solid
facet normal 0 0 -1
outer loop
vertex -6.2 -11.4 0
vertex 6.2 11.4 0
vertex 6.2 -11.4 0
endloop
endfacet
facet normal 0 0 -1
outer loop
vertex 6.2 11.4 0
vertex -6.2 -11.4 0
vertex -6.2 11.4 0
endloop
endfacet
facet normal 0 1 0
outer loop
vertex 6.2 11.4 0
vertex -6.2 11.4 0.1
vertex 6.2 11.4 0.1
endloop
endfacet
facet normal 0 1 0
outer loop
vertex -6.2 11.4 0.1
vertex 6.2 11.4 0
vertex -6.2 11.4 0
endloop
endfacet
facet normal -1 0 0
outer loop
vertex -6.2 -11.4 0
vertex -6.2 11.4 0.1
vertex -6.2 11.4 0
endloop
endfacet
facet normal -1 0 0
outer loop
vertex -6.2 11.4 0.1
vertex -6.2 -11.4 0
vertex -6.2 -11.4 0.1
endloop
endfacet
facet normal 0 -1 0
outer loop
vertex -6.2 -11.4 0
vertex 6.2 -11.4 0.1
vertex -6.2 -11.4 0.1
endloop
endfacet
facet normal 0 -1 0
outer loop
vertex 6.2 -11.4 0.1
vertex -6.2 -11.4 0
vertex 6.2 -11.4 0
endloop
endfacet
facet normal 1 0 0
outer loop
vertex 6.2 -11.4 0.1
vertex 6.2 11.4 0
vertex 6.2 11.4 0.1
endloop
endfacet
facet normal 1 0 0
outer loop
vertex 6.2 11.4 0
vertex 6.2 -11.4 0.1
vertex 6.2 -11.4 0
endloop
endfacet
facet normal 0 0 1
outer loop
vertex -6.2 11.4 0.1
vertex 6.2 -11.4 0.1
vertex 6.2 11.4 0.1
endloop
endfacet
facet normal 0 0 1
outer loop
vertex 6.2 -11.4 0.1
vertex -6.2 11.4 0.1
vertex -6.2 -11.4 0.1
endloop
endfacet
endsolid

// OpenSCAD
// file: ../p/box5-12.scad
use <../lib.scad>
function ldraw_lib__box5_12() = [
// 0 Box with 5 Faces without Any Edges
// 0 Name: box5-12.dat
// 0 Author: Chris Dee [cwdee]
// 0 !LDRAW_ORG Primitive UPDATE 2009-02
// 0 !LICENSE Licensed under CC BY 2.0 and CC BY 4.0 : see CAreadme.txt
// 
// 0 BFC CERTIFY CCW
  [0,"BFC","CERTIFY"],
  [0,"BFC","CCW"],
// 
// 0 !HISTORY 2009-09-03 [PTadmin] Official Update 2009-02
// 
// 
// 4 16 1 1 1 1 1 -1 -1 1 -1 -1 1 1
  [4,16,1,1,1,1,1,-1,-1,1,-1,-1,1,1],
// 4 16 -1 0 1 1 0 1 1 1 1 -1 1 1
  [4,16,-1,0,1,1,0,1,1,1,1,-1,1,1],
// 4 16 -1 0 -1 -1 0 1 -1 1 1 -1 1 -1
  [4,16,-1,0,-1,-1,0,1,-1,1,1,-1,1,-1],
// 4 16 1 0 -1 -1 0 -1 -1 1 -1 1 1 -1
  [4,16,1,0,-1,-1,0,-1,-1,1,-1,1,1,-1],
// 4 16 1 0 1 1 0 -1 1 1 -1 1 1 1
  [4,16,1,0,1,1,0,-1,1,1,-1,1,1,1],
// 0
];
makepoly(ldraw_lib__box5_12(), line=0.2);
// file: 4614425b.scad
use <../lib.scad>
use <../p/box5-12.scad>
function ldraw_lib__4614425b() = [
// 0 Sticker  2.7 x  1.3 with Chrome Silver Mirror
// 0 Name: 4614425b.dat
// 0 Author: Evert-Jan Boer [ejboer]
// 0 !LDRAW_ORG Part UPDATE 2020-03
// 0 !LICENSE Licensed under CC BY 2.0 and CC BY 4.0 : see CAreadme.txt
// 
// 0 BFC CERTIFY CCW
  [0,"BFC","CERTIFY"],
  [0,"BFC","CCW"],
// 
// 0 !KEYWORDS Set 10220, Volkswagen T1 Camper Van
// 
// 0 !HISTORY 2020-12-29 [PTadmin] Official Update 2020-03
// 
// 
// 1 16 0 -0.25 0 15.5 0 0 0 0.25 0 0 0 28.5 box5-12.dat
  [1,16,0,-0.25,0,15.5,0,0,0,0.25,0,0,0,28.5, ldraw_lib__box5_12()],
// 
// 4 383 15.5 -0.25 28.5 -15.5 -0.25 28.5 -15.5 -0.25 -28.5 15.5 -0.25 -28.5
  [4,383,15.5,-0.25,28.5,-15.5,-0.25,28.5,-15.5,-0.25,-28.5,15.5,-0.25,-28.5],
];
makepoly(ldraw_lib__4614425b(), line=0.2);
// main file
use <../lib.scad>
use <4614425b.scad>
function ldraw_lib__6061671b() = [
// 0 =Sticker  2.7 x  1.3 with Chrome Silver Mirror
// 0 Name: 6061671b.dat
// 0 Author: Evert-Jan Boer [ejboer]
// 0 !LDRAW_ORG Part Alias UPDATE 2020-03
// 0 !LICENSE Licensed under CC BY 2.0 and CC BY 4.0 : see CAreadme.txt
// 
// 0 BFC CERTIFY CCW
  [0,"BFC","CERTIFY"],
  [0,"BFC","CCW"],
// 
// 0 !KEYWORDS Set 10220, Volkswagen T1 Camper Van
// 
// 0 !HISTORY 2020-12-29 [PTadmin] Official Update 2020-03
// 
// 
// 0 // Alias of 4614425b
// 
// 1 16 0 0 0 1 0 0 0 1 0 0 0 1 4614425b.dat
  [1,16,0,0,0,1,0,0,0,1,0,0,0,1, ldraw_lib__4614425b()],
];
makepoly(ldraw_lib__6061671b(), line=0.2);
